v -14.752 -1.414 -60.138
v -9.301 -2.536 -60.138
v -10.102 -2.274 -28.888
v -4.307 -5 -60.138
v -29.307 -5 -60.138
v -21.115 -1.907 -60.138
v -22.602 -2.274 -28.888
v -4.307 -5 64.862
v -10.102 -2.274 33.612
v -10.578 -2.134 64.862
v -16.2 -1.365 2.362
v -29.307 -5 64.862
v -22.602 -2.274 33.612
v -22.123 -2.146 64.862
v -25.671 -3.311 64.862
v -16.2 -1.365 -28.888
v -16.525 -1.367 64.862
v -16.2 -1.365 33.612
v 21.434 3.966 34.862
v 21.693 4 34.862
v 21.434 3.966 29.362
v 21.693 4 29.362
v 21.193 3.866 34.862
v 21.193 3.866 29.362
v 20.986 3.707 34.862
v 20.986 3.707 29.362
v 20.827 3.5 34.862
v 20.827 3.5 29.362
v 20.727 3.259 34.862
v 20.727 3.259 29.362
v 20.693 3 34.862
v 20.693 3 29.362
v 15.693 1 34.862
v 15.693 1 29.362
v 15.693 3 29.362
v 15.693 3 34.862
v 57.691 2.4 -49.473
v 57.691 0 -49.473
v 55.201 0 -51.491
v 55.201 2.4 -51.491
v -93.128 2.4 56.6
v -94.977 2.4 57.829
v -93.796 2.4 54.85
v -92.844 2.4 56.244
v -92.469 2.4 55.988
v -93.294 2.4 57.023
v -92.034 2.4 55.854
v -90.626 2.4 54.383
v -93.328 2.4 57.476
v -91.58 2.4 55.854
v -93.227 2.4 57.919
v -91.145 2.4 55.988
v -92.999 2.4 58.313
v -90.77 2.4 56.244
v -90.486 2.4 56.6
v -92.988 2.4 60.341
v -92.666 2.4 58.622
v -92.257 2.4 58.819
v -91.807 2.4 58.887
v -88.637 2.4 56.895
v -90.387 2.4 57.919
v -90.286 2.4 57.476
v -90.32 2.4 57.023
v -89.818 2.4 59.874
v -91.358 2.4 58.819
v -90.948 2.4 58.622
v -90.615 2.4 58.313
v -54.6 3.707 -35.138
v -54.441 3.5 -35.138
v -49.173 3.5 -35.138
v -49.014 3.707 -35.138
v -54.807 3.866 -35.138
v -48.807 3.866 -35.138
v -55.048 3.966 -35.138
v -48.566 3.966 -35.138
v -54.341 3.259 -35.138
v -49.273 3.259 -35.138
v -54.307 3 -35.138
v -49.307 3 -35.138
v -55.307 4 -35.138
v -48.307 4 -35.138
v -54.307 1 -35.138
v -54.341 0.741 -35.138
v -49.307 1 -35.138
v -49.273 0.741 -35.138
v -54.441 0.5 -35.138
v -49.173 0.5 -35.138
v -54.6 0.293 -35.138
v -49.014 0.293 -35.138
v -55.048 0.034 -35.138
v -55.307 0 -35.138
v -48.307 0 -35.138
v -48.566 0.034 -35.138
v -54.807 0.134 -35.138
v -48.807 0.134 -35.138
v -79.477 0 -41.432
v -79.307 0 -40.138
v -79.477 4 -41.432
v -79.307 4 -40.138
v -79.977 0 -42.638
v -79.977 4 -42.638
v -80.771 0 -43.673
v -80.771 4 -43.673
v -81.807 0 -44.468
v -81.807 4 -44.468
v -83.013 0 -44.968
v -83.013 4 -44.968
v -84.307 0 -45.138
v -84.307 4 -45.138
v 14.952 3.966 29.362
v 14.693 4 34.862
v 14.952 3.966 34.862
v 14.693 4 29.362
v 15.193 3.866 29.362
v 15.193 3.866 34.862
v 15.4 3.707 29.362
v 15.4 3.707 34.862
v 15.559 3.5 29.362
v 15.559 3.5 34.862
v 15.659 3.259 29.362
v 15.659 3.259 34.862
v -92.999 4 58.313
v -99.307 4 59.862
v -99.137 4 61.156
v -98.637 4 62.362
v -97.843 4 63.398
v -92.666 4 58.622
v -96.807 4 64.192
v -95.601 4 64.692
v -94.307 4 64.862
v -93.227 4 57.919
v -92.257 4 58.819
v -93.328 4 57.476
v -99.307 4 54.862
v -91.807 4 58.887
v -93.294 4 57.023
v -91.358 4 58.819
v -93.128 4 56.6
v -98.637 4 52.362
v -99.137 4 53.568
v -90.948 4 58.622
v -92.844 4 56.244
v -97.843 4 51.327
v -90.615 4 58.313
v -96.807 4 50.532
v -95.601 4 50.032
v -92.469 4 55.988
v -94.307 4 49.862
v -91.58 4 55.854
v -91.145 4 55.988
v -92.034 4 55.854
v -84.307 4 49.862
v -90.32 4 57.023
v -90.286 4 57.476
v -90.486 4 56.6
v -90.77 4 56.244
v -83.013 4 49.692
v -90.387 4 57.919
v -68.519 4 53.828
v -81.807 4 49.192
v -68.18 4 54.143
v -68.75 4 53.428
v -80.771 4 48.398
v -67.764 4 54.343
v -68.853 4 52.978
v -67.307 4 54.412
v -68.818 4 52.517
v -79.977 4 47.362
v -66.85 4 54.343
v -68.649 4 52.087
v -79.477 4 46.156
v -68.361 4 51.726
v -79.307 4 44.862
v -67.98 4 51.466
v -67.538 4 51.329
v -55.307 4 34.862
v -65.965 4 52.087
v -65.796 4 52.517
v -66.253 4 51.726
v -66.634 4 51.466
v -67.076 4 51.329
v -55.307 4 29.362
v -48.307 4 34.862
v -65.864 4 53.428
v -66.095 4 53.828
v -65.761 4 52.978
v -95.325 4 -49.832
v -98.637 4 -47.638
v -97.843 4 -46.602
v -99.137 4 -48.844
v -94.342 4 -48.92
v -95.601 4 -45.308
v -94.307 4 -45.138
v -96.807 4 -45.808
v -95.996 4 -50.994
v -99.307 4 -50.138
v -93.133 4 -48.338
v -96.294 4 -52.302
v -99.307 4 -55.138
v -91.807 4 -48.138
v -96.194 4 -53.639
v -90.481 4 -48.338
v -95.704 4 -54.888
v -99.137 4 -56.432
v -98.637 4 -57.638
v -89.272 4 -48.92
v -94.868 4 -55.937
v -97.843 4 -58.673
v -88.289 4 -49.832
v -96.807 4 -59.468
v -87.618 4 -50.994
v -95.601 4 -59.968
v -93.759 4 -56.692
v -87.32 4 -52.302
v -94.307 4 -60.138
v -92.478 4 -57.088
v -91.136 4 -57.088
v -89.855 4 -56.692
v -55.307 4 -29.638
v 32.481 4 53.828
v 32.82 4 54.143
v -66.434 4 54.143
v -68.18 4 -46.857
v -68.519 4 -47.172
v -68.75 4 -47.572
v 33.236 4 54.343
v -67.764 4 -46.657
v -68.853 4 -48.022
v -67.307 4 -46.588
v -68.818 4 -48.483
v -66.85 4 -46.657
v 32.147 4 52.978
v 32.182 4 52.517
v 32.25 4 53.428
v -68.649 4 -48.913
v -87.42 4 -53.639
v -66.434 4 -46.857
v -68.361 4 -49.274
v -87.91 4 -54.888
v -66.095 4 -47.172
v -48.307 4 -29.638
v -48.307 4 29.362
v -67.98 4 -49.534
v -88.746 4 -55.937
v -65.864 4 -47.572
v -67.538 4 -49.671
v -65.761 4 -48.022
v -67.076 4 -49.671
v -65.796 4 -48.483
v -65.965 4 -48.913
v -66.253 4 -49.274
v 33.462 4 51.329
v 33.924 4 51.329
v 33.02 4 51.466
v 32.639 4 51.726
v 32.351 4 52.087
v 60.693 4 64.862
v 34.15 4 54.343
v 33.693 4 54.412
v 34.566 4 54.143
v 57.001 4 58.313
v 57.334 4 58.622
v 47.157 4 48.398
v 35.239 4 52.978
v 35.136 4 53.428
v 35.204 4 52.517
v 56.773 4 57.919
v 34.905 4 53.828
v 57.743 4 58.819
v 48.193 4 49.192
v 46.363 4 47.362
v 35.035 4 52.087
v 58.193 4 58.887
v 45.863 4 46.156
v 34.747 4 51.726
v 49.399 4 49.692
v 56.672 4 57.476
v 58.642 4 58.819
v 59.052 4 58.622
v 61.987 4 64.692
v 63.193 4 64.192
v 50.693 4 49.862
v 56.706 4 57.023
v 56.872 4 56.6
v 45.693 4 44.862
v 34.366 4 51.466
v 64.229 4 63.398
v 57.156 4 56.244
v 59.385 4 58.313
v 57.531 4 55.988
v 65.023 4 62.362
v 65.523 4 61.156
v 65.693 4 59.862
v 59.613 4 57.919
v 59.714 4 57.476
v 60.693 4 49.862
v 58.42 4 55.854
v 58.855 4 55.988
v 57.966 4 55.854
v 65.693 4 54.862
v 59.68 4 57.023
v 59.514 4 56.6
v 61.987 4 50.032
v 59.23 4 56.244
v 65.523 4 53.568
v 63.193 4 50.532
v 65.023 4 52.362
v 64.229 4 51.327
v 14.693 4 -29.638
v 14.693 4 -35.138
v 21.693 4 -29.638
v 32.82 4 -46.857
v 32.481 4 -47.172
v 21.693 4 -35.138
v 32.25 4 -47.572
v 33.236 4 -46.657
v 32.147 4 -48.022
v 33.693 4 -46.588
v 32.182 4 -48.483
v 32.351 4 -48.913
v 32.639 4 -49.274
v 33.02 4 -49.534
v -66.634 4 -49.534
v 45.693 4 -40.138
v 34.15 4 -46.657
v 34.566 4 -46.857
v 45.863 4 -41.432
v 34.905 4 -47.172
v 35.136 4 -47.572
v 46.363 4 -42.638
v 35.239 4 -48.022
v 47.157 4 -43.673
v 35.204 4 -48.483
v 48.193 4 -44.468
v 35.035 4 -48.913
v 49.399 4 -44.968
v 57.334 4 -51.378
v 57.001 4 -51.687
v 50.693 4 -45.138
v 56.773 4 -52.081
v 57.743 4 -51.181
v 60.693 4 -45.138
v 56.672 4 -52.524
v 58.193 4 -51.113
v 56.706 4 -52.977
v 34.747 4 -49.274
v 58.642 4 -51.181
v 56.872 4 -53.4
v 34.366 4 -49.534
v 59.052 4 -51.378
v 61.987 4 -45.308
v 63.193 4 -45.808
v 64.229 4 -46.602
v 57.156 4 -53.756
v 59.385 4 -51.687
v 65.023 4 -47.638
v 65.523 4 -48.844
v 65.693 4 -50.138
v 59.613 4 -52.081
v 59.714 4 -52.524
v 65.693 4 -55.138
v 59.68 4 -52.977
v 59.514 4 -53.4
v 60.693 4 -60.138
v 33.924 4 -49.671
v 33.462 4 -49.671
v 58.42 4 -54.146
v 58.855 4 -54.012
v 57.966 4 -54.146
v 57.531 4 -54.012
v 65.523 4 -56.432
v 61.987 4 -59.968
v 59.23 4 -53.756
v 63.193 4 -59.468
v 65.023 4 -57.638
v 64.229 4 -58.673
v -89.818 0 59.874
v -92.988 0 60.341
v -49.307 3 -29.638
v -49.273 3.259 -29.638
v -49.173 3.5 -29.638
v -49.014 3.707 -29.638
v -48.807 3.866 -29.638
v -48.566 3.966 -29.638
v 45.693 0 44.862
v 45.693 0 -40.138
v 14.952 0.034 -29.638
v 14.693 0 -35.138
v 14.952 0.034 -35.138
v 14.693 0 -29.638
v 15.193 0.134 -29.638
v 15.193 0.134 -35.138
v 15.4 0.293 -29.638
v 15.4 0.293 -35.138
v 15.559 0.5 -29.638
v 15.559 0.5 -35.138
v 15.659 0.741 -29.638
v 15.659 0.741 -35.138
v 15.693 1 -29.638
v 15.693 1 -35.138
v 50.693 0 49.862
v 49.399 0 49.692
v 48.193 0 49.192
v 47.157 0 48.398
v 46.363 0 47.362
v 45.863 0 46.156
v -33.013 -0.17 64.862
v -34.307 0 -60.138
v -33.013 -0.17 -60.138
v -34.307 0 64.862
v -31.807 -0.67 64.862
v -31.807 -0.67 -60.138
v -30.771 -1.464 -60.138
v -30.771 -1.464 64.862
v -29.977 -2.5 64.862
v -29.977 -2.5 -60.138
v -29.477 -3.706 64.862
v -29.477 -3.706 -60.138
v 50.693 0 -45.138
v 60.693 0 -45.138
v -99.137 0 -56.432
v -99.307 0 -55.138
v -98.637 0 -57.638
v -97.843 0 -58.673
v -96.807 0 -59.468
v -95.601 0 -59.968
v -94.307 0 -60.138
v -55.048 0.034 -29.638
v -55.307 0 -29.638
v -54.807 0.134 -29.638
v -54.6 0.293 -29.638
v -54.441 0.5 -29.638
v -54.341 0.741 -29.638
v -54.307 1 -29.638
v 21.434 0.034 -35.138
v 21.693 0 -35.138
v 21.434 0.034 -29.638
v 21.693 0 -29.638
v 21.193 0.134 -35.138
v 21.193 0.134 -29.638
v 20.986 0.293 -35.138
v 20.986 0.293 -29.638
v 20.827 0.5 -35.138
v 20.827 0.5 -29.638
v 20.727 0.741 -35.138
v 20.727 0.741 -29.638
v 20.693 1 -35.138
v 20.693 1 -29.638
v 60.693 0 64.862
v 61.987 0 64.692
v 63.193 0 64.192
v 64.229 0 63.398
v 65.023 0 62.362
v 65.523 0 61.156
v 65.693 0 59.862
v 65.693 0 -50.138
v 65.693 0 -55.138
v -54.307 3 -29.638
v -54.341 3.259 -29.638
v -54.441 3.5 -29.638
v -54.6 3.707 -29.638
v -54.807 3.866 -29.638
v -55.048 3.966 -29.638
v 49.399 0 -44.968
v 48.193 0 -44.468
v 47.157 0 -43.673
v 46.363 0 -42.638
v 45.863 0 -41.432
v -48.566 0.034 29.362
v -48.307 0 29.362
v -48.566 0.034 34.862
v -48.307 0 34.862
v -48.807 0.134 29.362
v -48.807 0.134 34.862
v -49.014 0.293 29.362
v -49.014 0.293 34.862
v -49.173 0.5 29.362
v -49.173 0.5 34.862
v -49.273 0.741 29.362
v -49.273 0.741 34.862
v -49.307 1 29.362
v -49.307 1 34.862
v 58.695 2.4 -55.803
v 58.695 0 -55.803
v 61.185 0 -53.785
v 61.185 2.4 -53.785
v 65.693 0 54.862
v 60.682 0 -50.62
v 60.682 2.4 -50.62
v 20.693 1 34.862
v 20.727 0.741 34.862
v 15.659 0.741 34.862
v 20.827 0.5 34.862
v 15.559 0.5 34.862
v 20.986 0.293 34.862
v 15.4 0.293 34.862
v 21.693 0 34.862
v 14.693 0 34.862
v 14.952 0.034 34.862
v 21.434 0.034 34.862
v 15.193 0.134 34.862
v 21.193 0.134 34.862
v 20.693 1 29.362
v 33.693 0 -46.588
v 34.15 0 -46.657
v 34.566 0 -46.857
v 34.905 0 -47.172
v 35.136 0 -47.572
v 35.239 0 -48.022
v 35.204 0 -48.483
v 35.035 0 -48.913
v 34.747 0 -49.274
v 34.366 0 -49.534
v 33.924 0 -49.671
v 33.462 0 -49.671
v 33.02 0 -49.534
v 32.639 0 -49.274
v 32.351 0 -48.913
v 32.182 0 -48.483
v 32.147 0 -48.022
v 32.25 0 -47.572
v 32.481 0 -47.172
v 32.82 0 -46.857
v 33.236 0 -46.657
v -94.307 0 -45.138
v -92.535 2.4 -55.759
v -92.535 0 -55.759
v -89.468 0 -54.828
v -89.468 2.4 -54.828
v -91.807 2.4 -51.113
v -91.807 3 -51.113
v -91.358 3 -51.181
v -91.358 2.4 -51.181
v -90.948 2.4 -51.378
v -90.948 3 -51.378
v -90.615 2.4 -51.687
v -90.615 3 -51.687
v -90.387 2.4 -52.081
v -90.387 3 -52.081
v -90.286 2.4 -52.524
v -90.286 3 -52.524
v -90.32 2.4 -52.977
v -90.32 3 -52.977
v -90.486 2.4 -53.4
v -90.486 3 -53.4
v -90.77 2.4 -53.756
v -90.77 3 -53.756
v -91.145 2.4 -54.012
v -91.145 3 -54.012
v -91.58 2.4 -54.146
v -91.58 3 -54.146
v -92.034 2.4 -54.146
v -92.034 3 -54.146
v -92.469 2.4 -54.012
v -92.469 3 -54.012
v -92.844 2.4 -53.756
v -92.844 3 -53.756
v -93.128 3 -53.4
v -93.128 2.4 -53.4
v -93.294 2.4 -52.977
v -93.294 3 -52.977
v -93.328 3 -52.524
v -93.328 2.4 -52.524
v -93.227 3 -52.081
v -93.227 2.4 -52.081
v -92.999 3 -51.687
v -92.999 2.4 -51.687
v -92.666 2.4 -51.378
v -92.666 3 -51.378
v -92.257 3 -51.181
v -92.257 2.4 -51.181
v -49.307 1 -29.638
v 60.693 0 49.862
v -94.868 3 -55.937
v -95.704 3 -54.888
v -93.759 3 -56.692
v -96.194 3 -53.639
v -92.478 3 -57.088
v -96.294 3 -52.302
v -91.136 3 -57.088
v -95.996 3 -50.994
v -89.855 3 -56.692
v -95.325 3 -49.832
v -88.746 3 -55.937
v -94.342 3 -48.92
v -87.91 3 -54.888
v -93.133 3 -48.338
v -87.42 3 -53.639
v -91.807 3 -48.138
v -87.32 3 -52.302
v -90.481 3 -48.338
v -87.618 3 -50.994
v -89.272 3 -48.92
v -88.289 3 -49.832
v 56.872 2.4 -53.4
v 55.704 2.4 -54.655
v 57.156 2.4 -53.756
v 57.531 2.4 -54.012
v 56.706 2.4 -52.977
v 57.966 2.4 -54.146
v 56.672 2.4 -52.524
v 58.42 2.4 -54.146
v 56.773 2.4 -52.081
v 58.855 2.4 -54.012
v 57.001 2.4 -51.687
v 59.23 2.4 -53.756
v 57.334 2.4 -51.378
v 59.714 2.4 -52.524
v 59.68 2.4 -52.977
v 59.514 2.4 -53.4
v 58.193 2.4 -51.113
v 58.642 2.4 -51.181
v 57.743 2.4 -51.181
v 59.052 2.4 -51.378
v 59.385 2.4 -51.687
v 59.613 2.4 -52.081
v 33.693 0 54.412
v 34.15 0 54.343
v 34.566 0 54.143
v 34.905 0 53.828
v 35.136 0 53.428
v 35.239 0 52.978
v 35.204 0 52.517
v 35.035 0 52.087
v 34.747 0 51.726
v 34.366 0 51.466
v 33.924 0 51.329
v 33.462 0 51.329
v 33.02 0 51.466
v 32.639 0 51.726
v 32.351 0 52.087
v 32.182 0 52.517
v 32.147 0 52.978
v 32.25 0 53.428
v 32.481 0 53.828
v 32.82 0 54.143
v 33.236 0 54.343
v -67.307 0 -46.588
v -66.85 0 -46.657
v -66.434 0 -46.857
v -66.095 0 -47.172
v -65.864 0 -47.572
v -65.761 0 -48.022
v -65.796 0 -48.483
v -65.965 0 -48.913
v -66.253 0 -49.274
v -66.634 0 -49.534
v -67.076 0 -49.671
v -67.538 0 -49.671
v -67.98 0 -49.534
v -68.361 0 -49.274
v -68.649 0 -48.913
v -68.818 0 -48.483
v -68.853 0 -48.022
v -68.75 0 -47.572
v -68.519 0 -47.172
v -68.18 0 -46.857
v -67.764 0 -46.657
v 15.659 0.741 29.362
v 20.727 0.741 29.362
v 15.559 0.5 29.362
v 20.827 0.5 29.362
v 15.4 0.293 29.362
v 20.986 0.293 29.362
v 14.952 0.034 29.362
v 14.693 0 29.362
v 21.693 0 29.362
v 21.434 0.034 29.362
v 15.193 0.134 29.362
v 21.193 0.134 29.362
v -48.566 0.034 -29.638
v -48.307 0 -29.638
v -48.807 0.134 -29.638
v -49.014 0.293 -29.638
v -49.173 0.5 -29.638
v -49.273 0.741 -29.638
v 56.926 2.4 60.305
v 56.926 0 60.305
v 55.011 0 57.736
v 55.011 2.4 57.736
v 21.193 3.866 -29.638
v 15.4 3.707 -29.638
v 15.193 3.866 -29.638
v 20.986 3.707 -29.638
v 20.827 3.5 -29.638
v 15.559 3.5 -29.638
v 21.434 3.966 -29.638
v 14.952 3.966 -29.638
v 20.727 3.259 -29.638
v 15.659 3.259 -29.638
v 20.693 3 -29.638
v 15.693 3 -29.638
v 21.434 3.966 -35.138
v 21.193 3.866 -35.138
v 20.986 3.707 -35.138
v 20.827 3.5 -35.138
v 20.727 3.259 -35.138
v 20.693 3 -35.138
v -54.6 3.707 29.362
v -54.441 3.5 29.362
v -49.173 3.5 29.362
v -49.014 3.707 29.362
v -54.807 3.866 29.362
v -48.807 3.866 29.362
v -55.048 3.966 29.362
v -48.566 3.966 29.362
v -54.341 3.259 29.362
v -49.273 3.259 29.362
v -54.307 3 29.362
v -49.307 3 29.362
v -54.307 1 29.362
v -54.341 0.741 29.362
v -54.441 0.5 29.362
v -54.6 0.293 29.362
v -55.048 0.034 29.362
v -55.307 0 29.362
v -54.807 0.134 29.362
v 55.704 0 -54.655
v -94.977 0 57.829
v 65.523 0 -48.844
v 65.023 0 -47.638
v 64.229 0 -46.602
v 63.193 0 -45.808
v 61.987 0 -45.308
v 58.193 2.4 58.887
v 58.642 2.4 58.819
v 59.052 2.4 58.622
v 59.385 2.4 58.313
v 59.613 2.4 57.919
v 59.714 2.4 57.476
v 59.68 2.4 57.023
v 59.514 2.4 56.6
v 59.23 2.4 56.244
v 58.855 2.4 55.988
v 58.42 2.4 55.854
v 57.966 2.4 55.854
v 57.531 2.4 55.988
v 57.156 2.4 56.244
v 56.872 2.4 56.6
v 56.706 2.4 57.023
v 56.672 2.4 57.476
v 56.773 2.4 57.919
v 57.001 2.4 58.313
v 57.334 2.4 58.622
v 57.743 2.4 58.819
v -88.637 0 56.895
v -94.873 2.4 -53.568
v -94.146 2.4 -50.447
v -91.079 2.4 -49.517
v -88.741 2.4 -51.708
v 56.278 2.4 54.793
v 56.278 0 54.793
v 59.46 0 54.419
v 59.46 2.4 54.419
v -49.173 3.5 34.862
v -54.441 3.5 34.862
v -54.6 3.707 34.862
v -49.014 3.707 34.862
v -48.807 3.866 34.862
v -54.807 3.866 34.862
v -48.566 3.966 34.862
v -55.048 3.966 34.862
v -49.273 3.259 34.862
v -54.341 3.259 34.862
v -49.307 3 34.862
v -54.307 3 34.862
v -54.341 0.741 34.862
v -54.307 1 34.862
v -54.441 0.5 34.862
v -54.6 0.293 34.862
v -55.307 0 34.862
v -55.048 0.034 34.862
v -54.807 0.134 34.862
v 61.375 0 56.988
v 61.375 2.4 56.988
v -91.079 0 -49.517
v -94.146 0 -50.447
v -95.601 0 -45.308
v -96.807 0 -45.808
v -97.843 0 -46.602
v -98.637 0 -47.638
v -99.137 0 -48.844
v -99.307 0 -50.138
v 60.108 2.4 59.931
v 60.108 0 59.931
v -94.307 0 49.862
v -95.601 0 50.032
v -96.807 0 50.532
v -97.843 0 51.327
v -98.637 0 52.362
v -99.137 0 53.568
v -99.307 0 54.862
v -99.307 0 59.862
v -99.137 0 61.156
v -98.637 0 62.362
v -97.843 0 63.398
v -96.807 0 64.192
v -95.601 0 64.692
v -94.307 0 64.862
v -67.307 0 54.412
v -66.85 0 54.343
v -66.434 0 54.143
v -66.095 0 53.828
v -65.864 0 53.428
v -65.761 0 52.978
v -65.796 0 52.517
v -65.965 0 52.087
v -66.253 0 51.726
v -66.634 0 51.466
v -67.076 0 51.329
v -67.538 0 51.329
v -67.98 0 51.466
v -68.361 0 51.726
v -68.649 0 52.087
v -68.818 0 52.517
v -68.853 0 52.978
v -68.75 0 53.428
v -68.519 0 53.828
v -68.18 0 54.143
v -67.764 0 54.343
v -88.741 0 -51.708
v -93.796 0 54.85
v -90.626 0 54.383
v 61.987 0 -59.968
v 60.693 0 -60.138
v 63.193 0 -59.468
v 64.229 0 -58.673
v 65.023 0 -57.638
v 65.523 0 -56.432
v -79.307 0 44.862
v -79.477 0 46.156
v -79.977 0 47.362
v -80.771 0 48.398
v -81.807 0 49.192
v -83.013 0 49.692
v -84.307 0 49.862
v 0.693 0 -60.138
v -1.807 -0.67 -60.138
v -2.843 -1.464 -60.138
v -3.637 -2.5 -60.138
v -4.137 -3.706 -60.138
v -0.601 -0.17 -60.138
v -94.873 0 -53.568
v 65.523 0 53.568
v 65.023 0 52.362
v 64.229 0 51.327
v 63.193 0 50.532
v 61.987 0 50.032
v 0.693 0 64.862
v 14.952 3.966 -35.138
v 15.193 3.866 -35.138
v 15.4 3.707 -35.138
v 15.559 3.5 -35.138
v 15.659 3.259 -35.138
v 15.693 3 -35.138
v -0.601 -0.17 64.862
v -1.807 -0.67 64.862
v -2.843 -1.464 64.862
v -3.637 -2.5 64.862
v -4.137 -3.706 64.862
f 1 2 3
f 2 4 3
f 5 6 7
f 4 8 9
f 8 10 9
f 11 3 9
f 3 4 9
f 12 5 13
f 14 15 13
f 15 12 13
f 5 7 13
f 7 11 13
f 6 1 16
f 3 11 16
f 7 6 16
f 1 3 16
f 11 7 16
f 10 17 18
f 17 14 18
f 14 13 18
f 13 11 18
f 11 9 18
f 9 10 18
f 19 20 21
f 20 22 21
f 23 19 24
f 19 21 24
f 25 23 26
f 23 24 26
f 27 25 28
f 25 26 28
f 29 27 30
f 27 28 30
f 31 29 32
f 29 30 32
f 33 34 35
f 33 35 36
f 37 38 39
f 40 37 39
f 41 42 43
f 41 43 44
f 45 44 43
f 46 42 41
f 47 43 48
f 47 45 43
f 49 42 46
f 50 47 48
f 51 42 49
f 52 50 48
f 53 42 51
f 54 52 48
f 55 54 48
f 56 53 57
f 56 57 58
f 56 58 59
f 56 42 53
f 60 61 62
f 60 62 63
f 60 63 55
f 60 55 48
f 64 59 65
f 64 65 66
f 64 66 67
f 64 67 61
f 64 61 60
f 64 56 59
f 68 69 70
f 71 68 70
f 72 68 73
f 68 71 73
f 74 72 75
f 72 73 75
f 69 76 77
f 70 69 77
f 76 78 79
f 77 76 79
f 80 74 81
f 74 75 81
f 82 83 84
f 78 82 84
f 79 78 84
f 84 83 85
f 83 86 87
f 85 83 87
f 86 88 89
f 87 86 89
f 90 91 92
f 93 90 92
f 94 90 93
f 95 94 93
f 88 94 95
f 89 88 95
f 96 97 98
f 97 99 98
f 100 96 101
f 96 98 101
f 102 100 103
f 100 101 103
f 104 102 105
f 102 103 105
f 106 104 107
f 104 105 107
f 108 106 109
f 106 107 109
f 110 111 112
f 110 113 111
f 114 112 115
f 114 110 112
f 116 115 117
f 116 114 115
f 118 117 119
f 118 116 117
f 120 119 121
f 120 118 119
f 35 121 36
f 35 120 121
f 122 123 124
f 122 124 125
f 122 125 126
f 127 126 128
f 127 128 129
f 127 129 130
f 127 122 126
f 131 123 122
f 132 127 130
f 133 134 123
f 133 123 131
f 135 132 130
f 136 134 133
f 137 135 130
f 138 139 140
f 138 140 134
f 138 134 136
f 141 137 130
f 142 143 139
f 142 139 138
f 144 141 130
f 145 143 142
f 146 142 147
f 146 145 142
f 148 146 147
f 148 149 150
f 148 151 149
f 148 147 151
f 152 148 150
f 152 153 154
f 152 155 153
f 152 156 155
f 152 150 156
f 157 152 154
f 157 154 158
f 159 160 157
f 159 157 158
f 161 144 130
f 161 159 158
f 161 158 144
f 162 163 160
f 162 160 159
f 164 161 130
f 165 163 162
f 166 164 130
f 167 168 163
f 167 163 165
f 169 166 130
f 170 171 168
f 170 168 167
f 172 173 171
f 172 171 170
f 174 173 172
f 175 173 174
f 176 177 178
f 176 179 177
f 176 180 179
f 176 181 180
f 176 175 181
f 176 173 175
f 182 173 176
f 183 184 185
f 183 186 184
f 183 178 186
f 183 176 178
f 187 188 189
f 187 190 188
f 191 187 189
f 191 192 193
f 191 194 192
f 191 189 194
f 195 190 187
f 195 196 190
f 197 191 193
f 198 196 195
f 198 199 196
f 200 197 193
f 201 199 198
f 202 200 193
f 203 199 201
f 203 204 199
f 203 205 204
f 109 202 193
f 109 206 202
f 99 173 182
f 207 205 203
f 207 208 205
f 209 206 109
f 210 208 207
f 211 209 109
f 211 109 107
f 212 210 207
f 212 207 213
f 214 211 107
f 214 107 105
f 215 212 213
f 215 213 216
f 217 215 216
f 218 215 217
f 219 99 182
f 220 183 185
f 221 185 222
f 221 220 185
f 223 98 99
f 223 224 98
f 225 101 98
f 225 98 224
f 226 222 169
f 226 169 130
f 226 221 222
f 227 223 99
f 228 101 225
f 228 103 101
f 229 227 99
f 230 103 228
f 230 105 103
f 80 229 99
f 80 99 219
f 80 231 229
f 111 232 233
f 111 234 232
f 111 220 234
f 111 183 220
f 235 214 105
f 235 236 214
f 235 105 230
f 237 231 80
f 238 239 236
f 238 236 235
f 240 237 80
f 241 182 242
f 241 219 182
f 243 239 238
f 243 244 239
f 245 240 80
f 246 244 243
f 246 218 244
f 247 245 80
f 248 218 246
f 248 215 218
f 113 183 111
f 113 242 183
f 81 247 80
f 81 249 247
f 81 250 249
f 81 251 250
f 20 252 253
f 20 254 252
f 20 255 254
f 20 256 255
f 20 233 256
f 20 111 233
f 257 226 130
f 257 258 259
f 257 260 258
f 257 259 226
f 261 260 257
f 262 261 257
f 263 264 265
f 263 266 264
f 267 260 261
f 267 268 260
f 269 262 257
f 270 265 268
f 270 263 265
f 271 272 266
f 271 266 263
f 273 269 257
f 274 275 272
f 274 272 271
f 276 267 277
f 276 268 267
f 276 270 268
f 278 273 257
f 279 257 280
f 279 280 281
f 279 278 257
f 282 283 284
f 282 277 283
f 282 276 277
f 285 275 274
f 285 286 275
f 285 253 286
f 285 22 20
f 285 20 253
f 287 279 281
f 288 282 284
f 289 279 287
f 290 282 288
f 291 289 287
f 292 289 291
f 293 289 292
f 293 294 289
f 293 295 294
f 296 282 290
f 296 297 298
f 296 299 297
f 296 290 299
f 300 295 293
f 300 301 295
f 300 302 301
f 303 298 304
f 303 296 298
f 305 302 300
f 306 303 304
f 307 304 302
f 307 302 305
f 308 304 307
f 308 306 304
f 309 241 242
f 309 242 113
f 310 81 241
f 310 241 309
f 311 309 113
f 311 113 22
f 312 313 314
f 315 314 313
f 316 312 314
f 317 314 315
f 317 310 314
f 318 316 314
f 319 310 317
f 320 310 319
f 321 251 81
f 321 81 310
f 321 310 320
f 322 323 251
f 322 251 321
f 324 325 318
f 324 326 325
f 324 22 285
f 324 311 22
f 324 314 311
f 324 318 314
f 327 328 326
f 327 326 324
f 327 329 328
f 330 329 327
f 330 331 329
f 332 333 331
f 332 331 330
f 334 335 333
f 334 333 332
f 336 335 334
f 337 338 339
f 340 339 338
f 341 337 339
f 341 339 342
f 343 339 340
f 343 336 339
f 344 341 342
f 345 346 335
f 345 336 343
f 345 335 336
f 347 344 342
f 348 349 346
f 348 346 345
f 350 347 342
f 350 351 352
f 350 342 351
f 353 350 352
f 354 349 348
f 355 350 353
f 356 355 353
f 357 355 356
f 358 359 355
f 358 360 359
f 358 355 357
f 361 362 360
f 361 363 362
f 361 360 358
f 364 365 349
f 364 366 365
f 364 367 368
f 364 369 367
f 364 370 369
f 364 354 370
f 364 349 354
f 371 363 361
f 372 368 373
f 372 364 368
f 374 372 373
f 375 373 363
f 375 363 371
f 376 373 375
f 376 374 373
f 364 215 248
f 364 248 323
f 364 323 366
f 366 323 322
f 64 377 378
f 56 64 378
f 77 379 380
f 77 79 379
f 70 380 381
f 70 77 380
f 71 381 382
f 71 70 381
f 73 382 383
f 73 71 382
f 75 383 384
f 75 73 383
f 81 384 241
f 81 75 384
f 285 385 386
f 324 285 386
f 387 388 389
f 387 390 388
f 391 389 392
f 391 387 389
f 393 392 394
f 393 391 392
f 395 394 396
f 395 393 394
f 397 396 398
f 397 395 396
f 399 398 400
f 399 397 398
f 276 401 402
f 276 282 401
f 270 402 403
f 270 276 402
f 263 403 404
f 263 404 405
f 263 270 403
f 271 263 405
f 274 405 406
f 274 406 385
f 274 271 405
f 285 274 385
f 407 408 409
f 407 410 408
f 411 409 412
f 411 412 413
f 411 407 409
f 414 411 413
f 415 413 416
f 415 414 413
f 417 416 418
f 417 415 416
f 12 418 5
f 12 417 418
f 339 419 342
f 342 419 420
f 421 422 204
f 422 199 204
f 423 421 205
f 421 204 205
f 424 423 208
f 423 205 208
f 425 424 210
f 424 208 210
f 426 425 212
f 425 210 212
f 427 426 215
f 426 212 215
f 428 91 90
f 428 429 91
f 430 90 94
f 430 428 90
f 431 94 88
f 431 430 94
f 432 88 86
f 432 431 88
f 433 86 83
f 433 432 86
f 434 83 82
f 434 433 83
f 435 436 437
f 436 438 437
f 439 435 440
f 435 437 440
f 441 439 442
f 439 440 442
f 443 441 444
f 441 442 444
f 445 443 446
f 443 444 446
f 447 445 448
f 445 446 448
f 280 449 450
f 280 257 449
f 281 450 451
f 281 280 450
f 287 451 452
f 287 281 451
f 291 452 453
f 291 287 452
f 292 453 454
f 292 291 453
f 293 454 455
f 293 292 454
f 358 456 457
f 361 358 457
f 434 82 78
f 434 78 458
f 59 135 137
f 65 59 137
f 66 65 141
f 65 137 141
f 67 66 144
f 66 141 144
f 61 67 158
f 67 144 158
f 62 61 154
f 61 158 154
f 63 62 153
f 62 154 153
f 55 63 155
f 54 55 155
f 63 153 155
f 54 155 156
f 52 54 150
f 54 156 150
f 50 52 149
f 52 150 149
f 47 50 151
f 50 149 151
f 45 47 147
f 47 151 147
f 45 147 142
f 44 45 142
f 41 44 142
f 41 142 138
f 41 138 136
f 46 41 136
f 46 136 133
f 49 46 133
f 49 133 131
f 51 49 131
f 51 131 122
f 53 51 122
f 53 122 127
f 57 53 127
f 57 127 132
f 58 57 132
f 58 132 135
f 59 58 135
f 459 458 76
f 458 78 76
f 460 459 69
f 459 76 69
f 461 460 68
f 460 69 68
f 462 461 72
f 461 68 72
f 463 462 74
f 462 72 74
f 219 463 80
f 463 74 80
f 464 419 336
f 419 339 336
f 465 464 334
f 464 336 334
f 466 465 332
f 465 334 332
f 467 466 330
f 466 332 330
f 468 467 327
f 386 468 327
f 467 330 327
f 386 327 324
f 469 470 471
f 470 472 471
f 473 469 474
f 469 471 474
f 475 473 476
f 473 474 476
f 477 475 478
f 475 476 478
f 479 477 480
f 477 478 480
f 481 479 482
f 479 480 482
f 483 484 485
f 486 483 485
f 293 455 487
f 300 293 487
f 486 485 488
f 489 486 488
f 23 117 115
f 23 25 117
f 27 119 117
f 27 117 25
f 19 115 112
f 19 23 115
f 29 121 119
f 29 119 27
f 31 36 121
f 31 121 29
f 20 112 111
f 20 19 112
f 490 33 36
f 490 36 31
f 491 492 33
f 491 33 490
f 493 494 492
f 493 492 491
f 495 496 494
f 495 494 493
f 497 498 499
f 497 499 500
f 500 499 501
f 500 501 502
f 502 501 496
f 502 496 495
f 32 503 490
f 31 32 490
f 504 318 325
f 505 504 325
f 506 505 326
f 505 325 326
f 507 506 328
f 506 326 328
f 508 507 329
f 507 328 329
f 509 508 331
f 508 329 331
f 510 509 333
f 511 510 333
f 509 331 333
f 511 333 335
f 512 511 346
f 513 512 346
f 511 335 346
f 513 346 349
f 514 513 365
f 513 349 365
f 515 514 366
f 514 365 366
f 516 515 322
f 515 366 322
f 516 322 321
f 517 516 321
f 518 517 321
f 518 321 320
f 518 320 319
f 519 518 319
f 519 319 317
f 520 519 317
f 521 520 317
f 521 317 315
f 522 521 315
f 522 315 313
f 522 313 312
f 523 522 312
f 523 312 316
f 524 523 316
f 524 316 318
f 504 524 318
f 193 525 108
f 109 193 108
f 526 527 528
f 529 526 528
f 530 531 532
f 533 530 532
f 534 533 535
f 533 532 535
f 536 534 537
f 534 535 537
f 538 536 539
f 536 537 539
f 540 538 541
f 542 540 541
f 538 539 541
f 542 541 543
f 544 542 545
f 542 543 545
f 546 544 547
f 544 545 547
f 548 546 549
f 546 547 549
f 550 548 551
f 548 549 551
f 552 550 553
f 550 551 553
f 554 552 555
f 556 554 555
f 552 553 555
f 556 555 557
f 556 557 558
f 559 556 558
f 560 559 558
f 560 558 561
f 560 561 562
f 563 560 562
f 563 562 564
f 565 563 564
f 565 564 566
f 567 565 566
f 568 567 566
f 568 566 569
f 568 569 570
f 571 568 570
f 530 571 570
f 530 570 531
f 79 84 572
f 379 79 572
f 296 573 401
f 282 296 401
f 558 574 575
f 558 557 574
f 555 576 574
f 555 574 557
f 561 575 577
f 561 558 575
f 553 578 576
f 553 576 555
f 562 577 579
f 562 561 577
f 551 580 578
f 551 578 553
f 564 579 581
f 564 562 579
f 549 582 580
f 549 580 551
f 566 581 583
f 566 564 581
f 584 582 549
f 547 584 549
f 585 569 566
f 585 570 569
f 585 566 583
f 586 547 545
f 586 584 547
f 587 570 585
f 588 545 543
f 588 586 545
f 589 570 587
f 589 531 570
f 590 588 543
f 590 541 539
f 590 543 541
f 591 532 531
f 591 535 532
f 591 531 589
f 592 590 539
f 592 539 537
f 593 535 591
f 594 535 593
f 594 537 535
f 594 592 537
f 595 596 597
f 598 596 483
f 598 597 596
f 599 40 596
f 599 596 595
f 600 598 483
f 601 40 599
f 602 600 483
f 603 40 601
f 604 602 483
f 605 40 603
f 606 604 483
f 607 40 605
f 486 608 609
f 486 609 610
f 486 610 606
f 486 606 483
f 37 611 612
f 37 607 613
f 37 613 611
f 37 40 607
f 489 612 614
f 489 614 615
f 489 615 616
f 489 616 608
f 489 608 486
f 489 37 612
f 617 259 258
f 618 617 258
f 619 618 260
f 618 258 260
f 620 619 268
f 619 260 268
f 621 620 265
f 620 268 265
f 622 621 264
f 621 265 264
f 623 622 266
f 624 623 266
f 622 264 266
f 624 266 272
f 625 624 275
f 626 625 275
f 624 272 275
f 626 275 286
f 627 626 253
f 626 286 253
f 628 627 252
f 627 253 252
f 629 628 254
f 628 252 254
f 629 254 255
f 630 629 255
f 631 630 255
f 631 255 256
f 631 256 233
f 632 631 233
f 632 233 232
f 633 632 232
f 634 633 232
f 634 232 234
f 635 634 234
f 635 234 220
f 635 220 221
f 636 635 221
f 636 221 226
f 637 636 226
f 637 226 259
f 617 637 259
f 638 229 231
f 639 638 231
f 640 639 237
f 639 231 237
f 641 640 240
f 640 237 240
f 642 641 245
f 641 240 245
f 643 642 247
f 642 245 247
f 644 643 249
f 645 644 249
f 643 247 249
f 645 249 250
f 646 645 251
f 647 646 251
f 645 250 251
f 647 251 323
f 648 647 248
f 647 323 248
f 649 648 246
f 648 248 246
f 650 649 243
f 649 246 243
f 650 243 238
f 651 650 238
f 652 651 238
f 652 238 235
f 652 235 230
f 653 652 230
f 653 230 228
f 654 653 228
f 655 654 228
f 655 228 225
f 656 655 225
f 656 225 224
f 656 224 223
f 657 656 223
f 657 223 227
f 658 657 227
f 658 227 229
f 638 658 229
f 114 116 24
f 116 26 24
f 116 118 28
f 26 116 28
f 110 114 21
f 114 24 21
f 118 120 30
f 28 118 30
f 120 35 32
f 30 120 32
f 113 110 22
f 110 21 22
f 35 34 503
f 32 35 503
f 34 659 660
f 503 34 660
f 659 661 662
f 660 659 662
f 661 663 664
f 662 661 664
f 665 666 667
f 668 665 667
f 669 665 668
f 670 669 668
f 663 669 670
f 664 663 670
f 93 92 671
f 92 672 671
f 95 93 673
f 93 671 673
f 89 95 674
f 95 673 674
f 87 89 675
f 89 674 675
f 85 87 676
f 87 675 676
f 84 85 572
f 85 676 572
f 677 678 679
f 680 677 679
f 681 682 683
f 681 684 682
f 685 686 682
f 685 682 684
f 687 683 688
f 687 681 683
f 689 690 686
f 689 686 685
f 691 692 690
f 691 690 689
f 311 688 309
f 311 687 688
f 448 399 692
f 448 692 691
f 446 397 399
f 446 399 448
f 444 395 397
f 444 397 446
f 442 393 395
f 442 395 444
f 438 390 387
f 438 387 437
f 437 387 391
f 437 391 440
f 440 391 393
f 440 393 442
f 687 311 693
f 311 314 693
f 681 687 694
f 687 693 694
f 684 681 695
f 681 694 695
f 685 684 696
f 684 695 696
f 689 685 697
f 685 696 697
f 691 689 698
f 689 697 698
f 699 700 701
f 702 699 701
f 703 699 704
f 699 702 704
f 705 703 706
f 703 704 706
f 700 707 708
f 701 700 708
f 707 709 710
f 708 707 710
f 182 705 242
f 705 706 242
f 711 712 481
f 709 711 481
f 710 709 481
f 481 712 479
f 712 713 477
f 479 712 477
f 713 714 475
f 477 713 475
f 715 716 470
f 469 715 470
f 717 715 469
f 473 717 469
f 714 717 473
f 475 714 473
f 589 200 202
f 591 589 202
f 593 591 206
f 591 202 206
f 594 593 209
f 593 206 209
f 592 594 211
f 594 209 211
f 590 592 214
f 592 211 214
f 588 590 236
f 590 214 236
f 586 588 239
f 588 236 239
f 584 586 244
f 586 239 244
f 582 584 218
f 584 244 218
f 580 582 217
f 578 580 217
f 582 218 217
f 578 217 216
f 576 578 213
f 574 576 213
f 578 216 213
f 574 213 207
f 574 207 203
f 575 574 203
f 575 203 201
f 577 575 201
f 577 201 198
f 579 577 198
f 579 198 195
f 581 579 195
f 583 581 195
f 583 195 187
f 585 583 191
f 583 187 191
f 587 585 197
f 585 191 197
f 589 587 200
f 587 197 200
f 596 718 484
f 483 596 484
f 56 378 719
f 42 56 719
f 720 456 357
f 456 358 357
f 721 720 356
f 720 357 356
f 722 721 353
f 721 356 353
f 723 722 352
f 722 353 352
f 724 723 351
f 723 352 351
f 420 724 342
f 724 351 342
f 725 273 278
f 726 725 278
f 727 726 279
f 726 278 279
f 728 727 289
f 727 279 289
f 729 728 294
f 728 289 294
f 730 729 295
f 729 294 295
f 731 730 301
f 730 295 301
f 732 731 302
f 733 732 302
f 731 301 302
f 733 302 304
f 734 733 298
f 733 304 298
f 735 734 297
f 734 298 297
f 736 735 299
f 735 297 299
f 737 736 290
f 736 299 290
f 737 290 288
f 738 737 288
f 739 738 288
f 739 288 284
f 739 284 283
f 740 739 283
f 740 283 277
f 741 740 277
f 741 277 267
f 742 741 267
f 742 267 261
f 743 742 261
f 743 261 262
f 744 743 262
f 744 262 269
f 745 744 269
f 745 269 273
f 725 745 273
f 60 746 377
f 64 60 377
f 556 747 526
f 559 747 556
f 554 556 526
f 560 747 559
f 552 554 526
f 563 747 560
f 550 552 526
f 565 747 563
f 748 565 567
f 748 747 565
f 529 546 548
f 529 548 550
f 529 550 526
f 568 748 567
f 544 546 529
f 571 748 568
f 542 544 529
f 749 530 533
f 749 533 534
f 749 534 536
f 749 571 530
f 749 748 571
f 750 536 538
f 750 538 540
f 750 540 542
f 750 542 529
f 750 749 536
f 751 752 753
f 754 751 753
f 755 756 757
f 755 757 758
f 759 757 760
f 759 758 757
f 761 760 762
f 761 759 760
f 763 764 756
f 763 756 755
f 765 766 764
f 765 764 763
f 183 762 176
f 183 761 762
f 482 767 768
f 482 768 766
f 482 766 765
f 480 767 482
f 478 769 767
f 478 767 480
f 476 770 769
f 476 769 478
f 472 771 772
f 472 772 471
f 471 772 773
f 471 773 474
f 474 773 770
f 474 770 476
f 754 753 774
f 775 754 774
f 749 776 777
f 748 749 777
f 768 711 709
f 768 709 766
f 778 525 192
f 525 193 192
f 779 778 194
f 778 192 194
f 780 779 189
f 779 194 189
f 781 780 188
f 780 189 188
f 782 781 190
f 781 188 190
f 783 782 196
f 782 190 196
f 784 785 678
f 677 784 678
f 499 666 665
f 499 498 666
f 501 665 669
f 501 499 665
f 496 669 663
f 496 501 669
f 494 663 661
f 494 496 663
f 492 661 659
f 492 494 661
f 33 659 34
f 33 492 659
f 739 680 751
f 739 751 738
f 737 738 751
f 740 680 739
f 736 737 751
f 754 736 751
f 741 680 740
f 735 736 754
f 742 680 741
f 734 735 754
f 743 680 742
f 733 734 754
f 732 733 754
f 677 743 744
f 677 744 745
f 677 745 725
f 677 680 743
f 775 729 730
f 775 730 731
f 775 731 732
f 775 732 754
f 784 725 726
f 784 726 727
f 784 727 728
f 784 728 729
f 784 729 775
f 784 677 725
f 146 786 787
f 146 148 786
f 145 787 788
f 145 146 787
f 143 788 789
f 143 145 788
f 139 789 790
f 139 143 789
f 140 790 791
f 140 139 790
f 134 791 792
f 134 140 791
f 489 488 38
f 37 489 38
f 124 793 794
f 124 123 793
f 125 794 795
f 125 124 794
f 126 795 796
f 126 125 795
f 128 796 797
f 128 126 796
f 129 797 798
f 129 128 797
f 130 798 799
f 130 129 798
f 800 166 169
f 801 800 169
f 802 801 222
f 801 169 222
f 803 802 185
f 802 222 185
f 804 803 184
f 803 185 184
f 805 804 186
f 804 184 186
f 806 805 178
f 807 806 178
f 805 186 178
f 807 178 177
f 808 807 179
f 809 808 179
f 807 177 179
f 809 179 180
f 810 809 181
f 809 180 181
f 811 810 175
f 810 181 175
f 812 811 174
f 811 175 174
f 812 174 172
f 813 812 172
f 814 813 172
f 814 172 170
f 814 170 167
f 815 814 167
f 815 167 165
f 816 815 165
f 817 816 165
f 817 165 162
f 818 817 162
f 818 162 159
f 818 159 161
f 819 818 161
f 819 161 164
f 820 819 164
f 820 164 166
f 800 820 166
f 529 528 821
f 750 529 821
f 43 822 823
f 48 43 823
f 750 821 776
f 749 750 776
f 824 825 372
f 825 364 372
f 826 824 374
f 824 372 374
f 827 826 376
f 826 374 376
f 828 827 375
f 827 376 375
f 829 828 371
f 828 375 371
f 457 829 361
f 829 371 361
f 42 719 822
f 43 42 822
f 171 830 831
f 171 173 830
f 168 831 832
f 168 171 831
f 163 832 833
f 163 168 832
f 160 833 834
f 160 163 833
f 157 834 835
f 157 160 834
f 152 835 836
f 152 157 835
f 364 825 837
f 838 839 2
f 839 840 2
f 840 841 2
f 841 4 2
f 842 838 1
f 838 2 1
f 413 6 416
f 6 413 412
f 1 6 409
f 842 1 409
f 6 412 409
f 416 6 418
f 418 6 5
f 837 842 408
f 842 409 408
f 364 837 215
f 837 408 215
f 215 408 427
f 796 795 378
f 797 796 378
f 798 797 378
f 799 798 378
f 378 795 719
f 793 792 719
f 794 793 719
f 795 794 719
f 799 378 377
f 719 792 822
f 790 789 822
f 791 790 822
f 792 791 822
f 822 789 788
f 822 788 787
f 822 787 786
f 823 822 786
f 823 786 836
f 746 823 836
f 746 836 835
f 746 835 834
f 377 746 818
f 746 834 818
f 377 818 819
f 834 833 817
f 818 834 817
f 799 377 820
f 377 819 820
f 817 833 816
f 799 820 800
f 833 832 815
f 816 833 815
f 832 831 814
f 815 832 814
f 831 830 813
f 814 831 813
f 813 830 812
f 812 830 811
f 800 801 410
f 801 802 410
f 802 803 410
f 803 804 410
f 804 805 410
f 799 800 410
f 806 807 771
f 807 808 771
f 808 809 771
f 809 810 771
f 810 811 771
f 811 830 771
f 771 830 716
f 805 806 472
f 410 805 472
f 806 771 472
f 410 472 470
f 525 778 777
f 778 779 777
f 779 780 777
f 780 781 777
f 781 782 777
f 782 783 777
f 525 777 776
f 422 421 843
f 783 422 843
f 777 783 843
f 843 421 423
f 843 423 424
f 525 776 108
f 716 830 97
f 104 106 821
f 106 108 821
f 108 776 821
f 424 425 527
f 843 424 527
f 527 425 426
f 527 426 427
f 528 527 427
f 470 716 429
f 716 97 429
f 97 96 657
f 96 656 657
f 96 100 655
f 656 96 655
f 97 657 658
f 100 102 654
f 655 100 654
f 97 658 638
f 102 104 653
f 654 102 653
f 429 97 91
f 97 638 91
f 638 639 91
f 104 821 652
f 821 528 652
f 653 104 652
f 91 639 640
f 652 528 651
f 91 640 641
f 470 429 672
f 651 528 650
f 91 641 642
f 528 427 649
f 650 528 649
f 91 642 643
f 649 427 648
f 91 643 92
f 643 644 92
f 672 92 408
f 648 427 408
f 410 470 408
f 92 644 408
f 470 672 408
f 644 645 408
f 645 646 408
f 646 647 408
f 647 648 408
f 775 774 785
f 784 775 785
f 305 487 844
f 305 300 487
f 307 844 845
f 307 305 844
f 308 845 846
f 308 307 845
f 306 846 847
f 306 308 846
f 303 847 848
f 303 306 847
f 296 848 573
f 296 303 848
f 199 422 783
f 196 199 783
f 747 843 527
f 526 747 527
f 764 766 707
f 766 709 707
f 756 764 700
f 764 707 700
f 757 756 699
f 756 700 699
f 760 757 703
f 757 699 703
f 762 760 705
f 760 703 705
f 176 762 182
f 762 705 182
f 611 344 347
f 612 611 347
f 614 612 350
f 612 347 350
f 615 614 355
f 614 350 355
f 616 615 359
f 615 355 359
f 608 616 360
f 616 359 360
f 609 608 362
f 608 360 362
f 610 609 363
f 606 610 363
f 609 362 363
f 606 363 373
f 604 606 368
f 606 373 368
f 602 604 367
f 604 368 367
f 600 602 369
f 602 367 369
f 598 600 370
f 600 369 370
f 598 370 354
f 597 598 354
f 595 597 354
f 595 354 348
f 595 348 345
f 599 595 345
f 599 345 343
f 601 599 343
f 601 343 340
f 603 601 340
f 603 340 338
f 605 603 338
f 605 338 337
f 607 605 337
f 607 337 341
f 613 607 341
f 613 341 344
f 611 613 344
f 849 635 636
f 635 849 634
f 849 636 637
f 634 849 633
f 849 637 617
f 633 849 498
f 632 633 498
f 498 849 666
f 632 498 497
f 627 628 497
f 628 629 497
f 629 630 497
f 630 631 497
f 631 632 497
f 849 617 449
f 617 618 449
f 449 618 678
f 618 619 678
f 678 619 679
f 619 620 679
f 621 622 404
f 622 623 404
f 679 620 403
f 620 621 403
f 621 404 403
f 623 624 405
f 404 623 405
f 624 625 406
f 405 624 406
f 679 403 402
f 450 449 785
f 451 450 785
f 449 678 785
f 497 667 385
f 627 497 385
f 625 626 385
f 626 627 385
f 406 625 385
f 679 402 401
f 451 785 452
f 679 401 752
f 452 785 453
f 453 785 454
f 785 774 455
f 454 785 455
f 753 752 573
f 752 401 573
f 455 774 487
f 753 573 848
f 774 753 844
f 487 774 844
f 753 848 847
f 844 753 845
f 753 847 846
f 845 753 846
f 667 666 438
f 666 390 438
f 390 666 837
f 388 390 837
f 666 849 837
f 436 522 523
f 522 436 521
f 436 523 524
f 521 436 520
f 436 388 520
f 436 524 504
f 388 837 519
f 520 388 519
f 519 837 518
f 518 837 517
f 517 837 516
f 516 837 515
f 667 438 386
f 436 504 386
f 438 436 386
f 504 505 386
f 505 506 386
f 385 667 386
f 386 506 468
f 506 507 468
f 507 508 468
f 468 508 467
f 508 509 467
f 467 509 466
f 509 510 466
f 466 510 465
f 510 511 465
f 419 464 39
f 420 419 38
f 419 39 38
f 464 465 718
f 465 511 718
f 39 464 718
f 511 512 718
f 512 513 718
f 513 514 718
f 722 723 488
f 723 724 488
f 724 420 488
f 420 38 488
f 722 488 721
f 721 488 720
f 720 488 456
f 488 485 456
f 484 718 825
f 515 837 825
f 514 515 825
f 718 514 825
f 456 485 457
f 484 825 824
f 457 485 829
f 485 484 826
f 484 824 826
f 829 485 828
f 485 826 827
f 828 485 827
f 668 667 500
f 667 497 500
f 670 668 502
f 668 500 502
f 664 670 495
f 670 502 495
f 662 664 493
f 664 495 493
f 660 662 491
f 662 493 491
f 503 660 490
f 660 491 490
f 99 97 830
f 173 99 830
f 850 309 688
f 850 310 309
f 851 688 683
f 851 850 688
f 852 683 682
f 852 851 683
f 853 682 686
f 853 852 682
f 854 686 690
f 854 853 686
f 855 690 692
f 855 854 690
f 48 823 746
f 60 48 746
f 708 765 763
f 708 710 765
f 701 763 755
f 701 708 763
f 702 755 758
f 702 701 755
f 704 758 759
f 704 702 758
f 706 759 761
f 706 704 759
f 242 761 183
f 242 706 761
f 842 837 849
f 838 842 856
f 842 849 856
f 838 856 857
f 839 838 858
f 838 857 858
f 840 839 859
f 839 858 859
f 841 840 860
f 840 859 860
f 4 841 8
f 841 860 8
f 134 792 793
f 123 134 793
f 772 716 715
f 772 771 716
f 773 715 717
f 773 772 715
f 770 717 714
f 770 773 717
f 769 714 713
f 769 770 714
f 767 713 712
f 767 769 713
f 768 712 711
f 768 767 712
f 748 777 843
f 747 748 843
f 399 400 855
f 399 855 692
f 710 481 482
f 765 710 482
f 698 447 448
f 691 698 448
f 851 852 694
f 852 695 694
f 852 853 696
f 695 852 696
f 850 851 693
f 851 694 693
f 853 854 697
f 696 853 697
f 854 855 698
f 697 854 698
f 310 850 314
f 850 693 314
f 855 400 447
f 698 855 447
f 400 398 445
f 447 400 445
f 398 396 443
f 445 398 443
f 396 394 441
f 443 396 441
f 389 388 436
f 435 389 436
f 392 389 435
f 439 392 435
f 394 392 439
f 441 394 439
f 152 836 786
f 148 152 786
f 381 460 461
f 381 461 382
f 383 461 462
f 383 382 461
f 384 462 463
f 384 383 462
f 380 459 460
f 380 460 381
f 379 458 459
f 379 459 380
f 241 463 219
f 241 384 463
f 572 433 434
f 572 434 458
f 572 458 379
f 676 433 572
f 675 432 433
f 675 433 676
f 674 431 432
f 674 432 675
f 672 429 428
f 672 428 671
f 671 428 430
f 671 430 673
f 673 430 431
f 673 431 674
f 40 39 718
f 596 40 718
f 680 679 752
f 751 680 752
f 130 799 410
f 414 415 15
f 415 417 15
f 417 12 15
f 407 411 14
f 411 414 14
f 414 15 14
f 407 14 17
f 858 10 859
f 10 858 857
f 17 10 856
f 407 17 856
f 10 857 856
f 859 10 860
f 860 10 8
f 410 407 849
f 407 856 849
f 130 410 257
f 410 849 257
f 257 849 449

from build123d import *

# Parameters (mm, degrees)
BOSS_EXTRUDE1_DEPTH = 4
SKETCH2_R           = 1.55
CUT_EXTRUDE3_DEPTH  = 119.680122062
FILLET1_R           = 5
SKETCH5_R           = 1.525
CUT_EXTRUDE4_DEPTH  = 10
SKETCH5_3_R         = 4.5
CUT_EXTRUDE5_DEPTH  = 1
CUT_EXTRUDE6_DEPTH  = 2.4
SKETCH8_W           = 25
SKETCH8_H           = 125
BOSS_EXTRUDE4_DEPTH = 5
CUT_EXTRUDE7_DEPTH  = 160.724398205
FILLET5_R           = 5
SKETCH10_W          = 5
SKETCH10_H          = 5.5
CUT_EXTRUDE8_DEPTH  = 5
FILLET7_R           = 1


with BuildPart() as part:
    # Sketch1 → Boss-Extrude1 (new body)
    with BuildSketch(Plane(origin=(0, 0, 0), x_dir=(1, 0, 0), z_dir=(0, 1, 0))):
        Polygon((-79.307015775, 45.137931034), (-79.307015775, -49.862068966), (-99.307015775, -49.862068966), (-99.307015775, -64.862068966), (-68.307015775, -64.862068966), (45.692984225, -64.862068966), (65.692984225, -64.862068966), (65.692984225, -49.862068966), (45.692984225, -49.862068966), (45.692984225, 45.137931034), (65.692984225, 45.137931034), (65.692984225, 60.137931034), (45.692984225, 60.137931034), (-68.307015775, 60.137931034), (-99.307015775, 60.137931034), (-99.307015775, 45.137931034), align=None)
    extrude(amount=BOSS_EXTRUDE1_DEPTH)

    # Sketch2 → Cut-Extrude3 (cut, through all)
    with BuildSketch(Plane(origin=(0, 4, 0), x_dir=(1, 0, 0), z_dir=(0, 1, 0))):
        with Locations(Location((33.692984225, 48.137931034, 0), (0, 0, 270))):
            Circle(SKETCH2_R)
        with Locations(Location((-67.307015775, 48.137931034, 0), (0, 0, 270))):
            Circle(SKETCH2_R)
        with Locations(Location((-67.307015775, -52.862068966, 0), (0, 0, 270))):
            Circle(SKETCH2_R)
        with Locations(Location((33.692984225, -52.862068966, 0), (0, 0, 270))):
            Circle(SKETCH2_R)
    extrude(amount=-CUT_EXTRUDE3_DEPTH, mode=Mode.SUBTRACT)

    # Fillet1
    fillet1_edges = [part.edges().sort_by_distance(p)[0] for p in [
        (65.692984225, 2, -60.137931034),
        (65.692984225, 2, -45.137931034),
        (45.692984225, 2, -45.137931034),
        (45.692984225, 2, 49.862068966),
        (65.692984225, 2, 49.862068966),
        (65.692984225, 2, 64.862068966),
        (-99.307015775, 2, 64.862068966),
        (-99.307015775, 2, 49.862068966),
        (-79.307015775, 2, 49.862068966),
        (-79.307015775, 2, -45.137931034),
        (-99.307015775, 2, -45.137931034),
        (-99.307015775, 2, -60.137931034),
    ]]
    fillet(fillet1_edges, radius=FILLET1_R)

    # Sketch5 → Cut-Extrude4 (cut)
    with BuildSketch(Plane(origin=(0, 4, 0), x_dir=(1, 0, 0), z_dir=(0, 1, 0))):
        with Locations(Location((-91.807015775, 52.637931034, 0), (0, 0, 270))):
            Circle(SKETCH5_R)
        with Locations(Location((-91.807015775, -57.362068966, 0), (0, 0, 270))):
            Circle(SKETCH5_R)
        with Locations(Location((58.192984225, -57.362068966, 0), (0, 0, 270))):
            Circle(SKETCH5_R)
        with Locations(Location((58.192984225, 52.637931034, 0), (0, 0, 270))):
            Circle(SKETCH5_R)
    extrude(amount=-CUT_EXTRUDE4_DEPTH, mode=Mode.SUBTRACT)

    # Sketch5<3> → Cut-Extrude5 (cut)
    with BuildSketch(Plane(origin=(0, 4, 0), x_dir=(1, 0, 0), z_dir=(0, 1, 0))):
        with Locations(Location((-91.807015775, 52.637931034, 0), (0, 0, 270))):
            Circle(SKETCH5_3_R)
    extrude(amount=-CUT_EXTRUDE5_DEPTH, mode=Mode.SUBTRACT)

    # Sketch6 → Cut-Extrude6 (cut)
    with BuildSketch(Plane.XZ):
        Polygon((-88.636873981, 56.89548456), (-89.81787093, 59.87420009), (-92.988012724, 60.340784495), (-94.977157568, 57.828653371), (-93.79616062, 54.849937841), (-90.626018826, 54.383353436), align=None)
        Polygon((61.375334539, 56.987707532), (60.108365894, 59.930884464), (56.92601558, 60.305245897), (55.010633912, 57.736430399), (56.277602557, 54.793253467), (59.459952871, 54.418892034), align=None)
        Polygon((60.682419613, -50.620454529), (57.690516013, -49.473278495), (55.201080626, -51.490755001), (55.703548838, -54.65540754), (58.695452437, -55.802583574), (61.184887825, -53.785107068), align=None)
        Polygon((-88.740685409, -51.707813788), (-91.079355756, -49.517352419), (-94.145686121, -50.447469665), (-94.87334614, -53.568048281), (-92.534675794, -55.75850965), (-89.468345428, -54.828392404), align=None)
    extrude(amount=-CUT_EXTRUDE6_DEPTH, mode=Mode.SUBTRACT)

    # Sketch8 → Boss-Extrude4 (add)
    with BuildSketch(Plane.XZ):
        with Locations((-16.807015775, 2.362068966)):
            Rectangle(SKETCH8_W, SKETCH8_H)
    extrude(amount=BOSS_EXTRUDE4_DEPTH)

    # Sketch9 → Cut-Extrude7 (cut, through all)
    with BuildSketch(Plane.XY.offset(64.862068966)):
        with BuildLine():
            Line((-4.307015775, -5), (-29.307015775, -5))
            add(Edge.make_bspline(
                [(-4.307015775, -5), (-15.592681682, 2.270069745), (-29.307015775, -5)],
                knots=[0, 0, 0, 1, 1, 1], degree=2))
        make_face()
    extrude(amount=-CUT_EXTRUDE7_DEPTH, mode=Mode.SUBTRACT)

    # Fillet5
    fillet5_edges = [part.edges().sort_by_distance(p)[0] for p in [
        (-29.307015775, 0, 2.362068966),
        (-4.307015775, 0, 2.362068966),
    ]]
    fillet(fillet5_edges, radius=FILLET5_R - 0.0001)  # a hair under: the kernel refuses the full size

    # Sketch10 → Cut-Extrude8 (cut)
    with BuildSketch(Plane.XZ):
        with Locations((18.192984225, -32.387931034)):
            Rectangle(SKETCH10_W, SKETCH10_H)
        with Locations((18.192984225, 32.112068966)):
            Rectangle(SKETCH10_W, SKETCH10_H)
        with Locations((-51.807015775, 32.112068966)):
            Rectangle(SKETCH10_W, SKETCH10_H)
        with Locations((-51.807015775, -32.387931034)):
            Rectangle(SKETCH10_W, SKETCH10_H)
    extrude(amount=-CUT_EXTRUDE8_DEPTH, mode=Mode.SUBTRACT)

    # Fillet7
    fillet7_edges = [part.edges().sort_by_distance(p)[0] for p in [
        (20.692984225, 4, -32.387931034),
        (15.692984225, 4, -32.387931034),
        (20.692984225, 0, -32.387931034),
        (15.692984225, 0, -32.387931034),
        (-54.307015775, 4, -32.387931034),
        (-49.307015775, 4, -32.387931034),
        (-54.307015775, 4, 32.112068966),
        (-49.307015775, 4, 32.112068966),
        (20.692984225, 4, 32.112068966),
        (15.692984225, 4, 32.112068966),
        (20.692984225, 0, 32.112068966),
        (15.692984225, 0, 32.112068966),
        (-49.307015775, 0, 32.112068966),
        (-54.307015775, 0, 32.112068966),
        (-49.307015775, 0, -32.387931034),
        (-54.307015775, 0, -32.387931034),
    ]]
    fillet(fillet7_edges, radius=FILLET7_R)


solid = part.part
